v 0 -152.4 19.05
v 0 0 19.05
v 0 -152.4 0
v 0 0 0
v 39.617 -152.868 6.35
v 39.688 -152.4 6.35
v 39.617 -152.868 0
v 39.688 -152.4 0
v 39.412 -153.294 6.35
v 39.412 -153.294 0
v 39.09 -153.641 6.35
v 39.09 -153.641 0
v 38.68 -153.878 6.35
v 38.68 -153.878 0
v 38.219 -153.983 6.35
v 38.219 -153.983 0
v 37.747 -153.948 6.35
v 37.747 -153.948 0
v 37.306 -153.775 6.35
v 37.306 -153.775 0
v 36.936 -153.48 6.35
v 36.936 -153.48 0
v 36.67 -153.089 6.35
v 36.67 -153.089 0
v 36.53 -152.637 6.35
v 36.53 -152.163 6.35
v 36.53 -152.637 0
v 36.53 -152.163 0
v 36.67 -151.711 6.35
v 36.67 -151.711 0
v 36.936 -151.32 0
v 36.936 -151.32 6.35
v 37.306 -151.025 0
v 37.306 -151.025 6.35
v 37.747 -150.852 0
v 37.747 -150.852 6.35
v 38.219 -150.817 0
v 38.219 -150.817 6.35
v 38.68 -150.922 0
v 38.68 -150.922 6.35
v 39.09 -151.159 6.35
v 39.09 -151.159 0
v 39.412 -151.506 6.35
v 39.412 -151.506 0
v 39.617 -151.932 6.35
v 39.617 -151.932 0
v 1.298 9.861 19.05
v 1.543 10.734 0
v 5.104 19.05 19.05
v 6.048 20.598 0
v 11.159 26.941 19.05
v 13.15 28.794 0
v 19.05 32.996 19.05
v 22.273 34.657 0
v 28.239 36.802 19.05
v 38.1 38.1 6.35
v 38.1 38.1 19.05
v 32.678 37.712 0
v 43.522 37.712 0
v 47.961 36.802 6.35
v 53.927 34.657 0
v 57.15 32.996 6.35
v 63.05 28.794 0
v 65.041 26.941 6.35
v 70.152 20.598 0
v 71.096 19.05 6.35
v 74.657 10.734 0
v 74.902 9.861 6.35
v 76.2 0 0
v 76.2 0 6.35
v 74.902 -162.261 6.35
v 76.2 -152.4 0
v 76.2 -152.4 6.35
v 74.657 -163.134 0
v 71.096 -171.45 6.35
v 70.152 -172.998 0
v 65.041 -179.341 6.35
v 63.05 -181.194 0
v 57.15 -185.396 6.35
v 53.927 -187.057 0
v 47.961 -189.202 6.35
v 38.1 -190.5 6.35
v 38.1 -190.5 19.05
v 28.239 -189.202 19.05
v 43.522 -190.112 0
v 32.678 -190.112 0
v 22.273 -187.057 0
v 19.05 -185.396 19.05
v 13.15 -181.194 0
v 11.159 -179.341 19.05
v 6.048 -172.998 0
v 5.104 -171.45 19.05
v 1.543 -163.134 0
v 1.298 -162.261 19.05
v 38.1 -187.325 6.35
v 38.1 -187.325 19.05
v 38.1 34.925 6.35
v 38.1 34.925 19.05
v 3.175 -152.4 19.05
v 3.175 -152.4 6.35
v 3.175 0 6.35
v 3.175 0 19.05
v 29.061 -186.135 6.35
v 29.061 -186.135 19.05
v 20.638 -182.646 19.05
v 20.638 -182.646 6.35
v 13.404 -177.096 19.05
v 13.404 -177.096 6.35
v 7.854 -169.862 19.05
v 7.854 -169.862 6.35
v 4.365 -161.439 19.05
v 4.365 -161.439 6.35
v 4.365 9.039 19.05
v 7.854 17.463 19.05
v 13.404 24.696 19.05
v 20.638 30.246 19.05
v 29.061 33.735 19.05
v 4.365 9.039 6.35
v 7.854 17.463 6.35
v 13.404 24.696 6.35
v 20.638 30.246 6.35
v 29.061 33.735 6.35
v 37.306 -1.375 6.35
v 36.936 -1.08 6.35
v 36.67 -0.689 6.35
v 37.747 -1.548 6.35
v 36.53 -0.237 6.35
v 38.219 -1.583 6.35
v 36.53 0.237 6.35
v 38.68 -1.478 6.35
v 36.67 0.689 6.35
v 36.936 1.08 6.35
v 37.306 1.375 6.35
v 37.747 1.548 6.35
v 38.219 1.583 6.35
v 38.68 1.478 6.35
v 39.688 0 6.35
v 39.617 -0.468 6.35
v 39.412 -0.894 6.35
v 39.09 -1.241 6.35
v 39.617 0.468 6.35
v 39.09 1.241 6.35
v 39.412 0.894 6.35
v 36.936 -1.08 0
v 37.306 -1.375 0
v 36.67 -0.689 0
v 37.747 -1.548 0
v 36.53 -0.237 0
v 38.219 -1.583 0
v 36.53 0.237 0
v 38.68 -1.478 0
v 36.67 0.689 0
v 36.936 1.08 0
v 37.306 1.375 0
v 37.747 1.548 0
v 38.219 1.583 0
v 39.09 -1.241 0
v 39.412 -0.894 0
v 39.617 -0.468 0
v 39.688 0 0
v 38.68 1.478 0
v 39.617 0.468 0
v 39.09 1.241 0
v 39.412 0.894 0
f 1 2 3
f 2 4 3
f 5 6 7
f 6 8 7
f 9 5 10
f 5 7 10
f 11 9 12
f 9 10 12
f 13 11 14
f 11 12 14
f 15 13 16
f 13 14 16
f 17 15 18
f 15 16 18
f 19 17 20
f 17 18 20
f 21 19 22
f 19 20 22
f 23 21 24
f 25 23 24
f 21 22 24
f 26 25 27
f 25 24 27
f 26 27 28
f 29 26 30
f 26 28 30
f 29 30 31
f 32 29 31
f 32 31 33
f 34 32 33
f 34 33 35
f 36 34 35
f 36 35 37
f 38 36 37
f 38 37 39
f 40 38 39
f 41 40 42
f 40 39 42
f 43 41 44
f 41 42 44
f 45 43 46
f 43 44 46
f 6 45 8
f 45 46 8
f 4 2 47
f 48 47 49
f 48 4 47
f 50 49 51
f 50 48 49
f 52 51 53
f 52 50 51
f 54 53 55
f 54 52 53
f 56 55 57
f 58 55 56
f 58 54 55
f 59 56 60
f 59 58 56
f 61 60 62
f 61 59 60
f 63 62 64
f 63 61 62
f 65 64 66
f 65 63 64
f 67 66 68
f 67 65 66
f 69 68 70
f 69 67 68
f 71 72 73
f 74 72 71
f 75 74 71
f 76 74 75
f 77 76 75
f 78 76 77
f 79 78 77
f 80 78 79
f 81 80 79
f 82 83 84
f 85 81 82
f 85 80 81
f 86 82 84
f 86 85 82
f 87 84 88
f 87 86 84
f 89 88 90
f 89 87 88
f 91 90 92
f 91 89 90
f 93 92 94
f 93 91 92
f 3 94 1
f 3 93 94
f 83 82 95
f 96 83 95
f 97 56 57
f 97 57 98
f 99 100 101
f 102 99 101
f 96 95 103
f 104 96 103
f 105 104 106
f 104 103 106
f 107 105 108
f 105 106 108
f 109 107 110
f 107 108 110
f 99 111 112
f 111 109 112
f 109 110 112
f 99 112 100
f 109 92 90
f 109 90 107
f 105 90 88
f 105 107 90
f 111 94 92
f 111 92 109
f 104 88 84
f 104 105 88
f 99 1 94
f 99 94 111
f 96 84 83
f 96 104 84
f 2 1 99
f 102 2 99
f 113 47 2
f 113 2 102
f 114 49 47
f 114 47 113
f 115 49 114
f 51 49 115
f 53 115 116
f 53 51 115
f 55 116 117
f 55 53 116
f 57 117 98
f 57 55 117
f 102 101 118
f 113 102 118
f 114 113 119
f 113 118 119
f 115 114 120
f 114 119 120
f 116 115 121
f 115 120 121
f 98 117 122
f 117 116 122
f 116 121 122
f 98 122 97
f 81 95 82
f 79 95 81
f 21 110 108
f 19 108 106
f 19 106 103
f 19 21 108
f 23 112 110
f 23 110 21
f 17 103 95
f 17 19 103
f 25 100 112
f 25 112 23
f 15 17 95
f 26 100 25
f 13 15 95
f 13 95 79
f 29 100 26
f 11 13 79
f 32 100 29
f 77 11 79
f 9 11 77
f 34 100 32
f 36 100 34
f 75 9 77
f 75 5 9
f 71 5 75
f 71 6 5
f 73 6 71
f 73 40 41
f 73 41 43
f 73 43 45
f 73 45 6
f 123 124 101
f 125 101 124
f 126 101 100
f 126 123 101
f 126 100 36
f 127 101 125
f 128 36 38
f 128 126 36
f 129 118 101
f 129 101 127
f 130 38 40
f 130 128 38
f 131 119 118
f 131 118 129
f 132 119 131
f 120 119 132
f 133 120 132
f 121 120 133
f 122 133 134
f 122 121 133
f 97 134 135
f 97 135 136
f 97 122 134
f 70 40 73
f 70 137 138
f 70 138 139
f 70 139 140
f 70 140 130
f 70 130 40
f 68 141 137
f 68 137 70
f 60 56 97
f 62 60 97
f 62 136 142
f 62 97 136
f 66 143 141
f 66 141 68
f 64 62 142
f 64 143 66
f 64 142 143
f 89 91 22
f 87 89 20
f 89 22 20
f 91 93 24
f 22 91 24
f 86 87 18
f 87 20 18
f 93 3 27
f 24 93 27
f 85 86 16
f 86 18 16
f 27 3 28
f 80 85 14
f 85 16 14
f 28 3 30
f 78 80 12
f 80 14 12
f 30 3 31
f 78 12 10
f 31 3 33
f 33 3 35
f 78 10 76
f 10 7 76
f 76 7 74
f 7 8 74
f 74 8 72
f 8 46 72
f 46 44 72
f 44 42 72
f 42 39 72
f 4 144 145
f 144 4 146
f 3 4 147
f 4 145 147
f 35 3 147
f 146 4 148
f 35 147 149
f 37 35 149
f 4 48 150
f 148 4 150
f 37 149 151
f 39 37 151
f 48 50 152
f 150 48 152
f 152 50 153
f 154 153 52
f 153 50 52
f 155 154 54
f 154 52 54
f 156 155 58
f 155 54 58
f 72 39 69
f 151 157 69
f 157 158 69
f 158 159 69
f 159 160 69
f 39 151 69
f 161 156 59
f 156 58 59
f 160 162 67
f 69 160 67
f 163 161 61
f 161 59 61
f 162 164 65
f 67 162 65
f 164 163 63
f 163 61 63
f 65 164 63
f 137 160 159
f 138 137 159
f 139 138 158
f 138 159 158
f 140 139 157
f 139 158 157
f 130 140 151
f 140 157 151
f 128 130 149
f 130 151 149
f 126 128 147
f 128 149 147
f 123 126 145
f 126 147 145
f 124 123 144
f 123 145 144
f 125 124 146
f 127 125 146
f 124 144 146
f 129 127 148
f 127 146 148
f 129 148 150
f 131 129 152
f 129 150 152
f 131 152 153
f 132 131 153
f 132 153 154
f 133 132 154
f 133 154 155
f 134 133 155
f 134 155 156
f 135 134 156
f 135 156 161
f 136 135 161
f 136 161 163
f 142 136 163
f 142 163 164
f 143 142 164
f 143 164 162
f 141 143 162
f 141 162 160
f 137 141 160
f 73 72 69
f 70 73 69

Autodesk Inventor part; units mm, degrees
ref_plane "YZ Plane" through (0, 0, 0) normal (1, 0, 0) x (0, 1, 0)
ref_plane "XZ Plane" through (0, 0, 0) normal (0, 1, 0) x (-1, 0, 0)
ref_plane "XY Plane" through (0, 0, 0) normal (0, 0, 1) x (1, 0, 0)
sketch "Sketch1" plane through (0, 0, 0) normal (0, 0, 1) x (1, 0, 0)
  line L0 (0, 0) -> (0, -152.4)
  line L1 (76.2, -152.4) -> (76.2, 0)
  arc A0 (0, -152.4) -> (76.2, -152.4) centre (38.1, -152.4) ccw
  arc A1 (76.2, 0) -> (0, 0) centre (38.1, 0) ccw
  circle A2 centre (38.1, 0) radius 1.5875
  circle A3 centre (38.1, -152.4) radius 1.5875
  dimension "d17" = 3.175
  dimension "d18" = 3.175
extrude "Extrusion1" add sketch "Sketch1" along normal blind 6.35 contours A1 L1 A0 L0 | A2 | A3
extrude "Extrusion4" cut sketch "Sketch1" along normal blind 12.7 contours A2 | A3
sketch "Sketch3" plane through (0, 0, 6.35) normal (0, 0, 1) x (1, 0, 0)
  arc A0 (0, -152.4) -> (76.2, -152.4) centre (38.1, -152.4) ccw projected
  line L0 (38.1, -190.5) -> (38.1, -187.325)
  arc A1 (3.175, -152.4) -> (38.1, -187.325) centre (38.1, -152.4) ccw
  arc A2 (76.2, 0) -> (0, 0) centre (38.1, 0) ccw projected
  line L1 (38.1, 38.1) -> (38.1, 34.925)
  arc A3 (38.1, 34.925) -> (3.175, 0) centre (38.1, 0) ccw
  line L2 (3.175, -152.4) -> (3.175, 0)
  line L3 (0, 0) -> (0, -152.4) projected
  dimension "d21" = 3.175
  dimension "d23" = 3.175
  dimension "d24" = 3.175
extrude "Extrusion5" add sketch "Sketch3" along normal blind 12.7
sketch "Sketch4" plane through (0, 0, 6.35) normal (0, 0, 1) x (1, 0, 0)
  point P0 (0, 0)
properties part number "ChainGuard"
